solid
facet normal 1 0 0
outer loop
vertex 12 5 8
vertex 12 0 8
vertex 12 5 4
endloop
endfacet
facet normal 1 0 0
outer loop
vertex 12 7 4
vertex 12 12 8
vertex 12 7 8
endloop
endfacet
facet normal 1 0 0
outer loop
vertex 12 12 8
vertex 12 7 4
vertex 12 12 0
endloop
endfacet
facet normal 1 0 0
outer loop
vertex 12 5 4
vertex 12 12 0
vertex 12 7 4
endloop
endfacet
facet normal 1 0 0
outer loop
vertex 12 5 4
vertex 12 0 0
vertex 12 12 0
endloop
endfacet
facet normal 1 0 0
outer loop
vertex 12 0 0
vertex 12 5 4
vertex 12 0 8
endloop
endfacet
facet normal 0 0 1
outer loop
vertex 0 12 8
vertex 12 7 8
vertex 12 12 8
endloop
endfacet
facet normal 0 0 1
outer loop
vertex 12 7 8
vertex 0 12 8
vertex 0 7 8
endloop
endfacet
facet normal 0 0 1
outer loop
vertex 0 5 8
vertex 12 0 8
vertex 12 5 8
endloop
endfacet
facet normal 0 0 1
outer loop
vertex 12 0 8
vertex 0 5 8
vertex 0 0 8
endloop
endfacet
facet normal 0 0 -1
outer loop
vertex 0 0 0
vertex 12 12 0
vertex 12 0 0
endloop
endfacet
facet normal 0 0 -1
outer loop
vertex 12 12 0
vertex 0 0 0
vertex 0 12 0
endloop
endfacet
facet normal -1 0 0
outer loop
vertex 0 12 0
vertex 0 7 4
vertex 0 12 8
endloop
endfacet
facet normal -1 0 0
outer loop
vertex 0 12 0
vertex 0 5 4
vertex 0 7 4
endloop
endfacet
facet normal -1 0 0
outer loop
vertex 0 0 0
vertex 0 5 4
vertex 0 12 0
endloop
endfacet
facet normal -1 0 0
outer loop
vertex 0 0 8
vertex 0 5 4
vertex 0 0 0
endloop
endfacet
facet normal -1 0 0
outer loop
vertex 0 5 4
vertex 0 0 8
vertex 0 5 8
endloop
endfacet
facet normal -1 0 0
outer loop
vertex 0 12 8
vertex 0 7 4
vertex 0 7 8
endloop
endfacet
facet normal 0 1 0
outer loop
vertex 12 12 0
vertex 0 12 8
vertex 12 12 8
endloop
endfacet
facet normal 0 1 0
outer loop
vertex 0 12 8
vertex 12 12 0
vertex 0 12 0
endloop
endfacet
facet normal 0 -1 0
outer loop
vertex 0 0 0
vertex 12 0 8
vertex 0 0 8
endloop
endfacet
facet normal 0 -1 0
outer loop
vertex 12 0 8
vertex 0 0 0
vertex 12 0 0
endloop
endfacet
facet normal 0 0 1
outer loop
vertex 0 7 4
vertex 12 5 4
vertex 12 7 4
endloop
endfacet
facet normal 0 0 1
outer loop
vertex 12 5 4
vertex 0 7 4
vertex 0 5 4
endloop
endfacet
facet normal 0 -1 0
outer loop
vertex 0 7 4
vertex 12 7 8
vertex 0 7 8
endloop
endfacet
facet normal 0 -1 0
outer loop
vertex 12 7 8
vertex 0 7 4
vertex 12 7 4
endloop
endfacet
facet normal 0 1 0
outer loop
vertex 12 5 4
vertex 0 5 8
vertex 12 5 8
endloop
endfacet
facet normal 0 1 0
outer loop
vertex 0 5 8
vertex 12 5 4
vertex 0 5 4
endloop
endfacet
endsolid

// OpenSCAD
$fn = 32;

// ----------------------------------------------------------------------
// Micro clip: slotted block, 5-20 mm class
// ----------------------------------------------------------------------

// --- parameters (mm) ---
block_l = 12;             // block length, X
block_w = 12;             // block width, Y
block_h = 8;              // block height, Z
slot_w = 2;               // slot width
slot_d = 4;               // slot depth from the top

difference() {
  cube([block_l, block_w, block_h]);
  translate([-1, block_w / 2 - slot_w / 2, block_h - slot_d])
    cube([block_l + 2, slot_w, slot_d + 1]);
}
